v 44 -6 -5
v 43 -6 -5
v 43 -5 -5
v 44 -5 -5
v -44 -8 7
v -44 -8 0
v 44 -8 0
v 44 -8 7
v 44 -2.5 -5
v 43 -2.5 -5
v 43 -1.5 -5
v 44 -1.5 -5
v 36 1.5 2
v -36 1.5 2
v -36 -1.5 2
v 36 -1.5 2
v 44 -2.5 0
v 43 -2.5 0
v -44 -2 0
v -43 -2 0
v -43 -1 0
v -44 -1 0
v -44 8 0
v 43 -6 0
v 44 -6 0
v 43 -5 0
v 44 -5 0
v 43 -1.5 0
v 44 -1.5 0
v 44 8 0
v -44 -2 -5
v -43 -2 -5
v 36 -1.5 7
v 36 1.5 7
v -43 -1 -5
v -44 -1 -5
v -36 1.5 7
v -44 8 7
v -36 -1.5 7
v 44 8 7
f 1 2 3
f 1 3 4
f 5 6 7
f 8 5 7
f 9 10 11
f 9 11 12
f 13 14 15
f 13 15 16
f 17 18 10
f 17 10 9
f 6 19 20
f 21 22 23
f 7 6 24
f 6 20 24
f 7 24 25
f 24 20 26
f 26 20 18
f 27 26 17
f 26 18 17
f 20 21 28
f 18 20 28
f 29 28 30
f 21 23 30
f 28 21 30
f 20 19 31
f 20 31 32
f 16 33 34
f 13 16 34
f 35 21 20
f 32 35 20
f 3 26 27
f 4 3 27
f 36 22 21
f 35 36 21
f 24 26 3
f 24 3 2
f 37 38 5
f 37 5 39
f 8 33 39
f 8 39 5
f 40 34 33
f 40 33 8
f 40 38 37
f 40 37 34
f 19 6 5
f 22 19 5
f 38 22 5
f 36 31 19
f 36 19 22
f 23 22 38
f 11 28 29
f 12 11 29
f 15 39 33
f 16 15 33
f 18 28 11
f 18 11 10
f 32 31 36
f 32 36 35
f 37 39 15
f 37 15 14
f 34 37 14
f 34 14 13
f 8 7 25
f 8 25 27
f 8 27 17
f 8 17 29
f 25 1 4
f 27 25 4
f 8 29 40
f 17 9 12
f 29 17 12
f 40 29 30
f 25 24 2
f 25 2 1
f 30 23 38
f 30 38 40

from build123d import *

# Parameters (mm, degrees)
F0_W     = 88
F0_H     = 16
F1_DEPTH = 7
F2_W     = 72
F2_H     = 3
F3_DEPTH = 5
F4_W     = 1
F4_H     = 1
F5_DEPTH = 5


with BuildPart() as f1:
    # F0 (on Top) → F1 (new body)
    with BuildSketch(Plane.XY):
        Rectangle(F0_W, F0_H)
    extrude(amount=F1_DEPTH)

    # F2 (on face) → F3 (cut)
    with BuildSketch(Plane.XY.offset(7)):
        Rectangle(F2_W, F2_H)
    extrude(amount=-F3_DEPTH, mode=Mode.SUBTRACT)

    # F4 (on face) → F5 (join)
    with BuildSketch(Plane(origin=(0, 0, 0), x_dir=(1, 0, 0), z_dir=(0, 0, -1))):
        with Locations((-43.5, 1.5)):
            Rectangle(F4_W, F4_H)
        with Locations((43.5, 5.5)):
            Rectangle(F4_W, F4_H)
        with Locations((43.5, 2)):
            Rectangle(F4_W, F4_H)
    extrude(amount=F5_DEPTH)


solid = f1.part
